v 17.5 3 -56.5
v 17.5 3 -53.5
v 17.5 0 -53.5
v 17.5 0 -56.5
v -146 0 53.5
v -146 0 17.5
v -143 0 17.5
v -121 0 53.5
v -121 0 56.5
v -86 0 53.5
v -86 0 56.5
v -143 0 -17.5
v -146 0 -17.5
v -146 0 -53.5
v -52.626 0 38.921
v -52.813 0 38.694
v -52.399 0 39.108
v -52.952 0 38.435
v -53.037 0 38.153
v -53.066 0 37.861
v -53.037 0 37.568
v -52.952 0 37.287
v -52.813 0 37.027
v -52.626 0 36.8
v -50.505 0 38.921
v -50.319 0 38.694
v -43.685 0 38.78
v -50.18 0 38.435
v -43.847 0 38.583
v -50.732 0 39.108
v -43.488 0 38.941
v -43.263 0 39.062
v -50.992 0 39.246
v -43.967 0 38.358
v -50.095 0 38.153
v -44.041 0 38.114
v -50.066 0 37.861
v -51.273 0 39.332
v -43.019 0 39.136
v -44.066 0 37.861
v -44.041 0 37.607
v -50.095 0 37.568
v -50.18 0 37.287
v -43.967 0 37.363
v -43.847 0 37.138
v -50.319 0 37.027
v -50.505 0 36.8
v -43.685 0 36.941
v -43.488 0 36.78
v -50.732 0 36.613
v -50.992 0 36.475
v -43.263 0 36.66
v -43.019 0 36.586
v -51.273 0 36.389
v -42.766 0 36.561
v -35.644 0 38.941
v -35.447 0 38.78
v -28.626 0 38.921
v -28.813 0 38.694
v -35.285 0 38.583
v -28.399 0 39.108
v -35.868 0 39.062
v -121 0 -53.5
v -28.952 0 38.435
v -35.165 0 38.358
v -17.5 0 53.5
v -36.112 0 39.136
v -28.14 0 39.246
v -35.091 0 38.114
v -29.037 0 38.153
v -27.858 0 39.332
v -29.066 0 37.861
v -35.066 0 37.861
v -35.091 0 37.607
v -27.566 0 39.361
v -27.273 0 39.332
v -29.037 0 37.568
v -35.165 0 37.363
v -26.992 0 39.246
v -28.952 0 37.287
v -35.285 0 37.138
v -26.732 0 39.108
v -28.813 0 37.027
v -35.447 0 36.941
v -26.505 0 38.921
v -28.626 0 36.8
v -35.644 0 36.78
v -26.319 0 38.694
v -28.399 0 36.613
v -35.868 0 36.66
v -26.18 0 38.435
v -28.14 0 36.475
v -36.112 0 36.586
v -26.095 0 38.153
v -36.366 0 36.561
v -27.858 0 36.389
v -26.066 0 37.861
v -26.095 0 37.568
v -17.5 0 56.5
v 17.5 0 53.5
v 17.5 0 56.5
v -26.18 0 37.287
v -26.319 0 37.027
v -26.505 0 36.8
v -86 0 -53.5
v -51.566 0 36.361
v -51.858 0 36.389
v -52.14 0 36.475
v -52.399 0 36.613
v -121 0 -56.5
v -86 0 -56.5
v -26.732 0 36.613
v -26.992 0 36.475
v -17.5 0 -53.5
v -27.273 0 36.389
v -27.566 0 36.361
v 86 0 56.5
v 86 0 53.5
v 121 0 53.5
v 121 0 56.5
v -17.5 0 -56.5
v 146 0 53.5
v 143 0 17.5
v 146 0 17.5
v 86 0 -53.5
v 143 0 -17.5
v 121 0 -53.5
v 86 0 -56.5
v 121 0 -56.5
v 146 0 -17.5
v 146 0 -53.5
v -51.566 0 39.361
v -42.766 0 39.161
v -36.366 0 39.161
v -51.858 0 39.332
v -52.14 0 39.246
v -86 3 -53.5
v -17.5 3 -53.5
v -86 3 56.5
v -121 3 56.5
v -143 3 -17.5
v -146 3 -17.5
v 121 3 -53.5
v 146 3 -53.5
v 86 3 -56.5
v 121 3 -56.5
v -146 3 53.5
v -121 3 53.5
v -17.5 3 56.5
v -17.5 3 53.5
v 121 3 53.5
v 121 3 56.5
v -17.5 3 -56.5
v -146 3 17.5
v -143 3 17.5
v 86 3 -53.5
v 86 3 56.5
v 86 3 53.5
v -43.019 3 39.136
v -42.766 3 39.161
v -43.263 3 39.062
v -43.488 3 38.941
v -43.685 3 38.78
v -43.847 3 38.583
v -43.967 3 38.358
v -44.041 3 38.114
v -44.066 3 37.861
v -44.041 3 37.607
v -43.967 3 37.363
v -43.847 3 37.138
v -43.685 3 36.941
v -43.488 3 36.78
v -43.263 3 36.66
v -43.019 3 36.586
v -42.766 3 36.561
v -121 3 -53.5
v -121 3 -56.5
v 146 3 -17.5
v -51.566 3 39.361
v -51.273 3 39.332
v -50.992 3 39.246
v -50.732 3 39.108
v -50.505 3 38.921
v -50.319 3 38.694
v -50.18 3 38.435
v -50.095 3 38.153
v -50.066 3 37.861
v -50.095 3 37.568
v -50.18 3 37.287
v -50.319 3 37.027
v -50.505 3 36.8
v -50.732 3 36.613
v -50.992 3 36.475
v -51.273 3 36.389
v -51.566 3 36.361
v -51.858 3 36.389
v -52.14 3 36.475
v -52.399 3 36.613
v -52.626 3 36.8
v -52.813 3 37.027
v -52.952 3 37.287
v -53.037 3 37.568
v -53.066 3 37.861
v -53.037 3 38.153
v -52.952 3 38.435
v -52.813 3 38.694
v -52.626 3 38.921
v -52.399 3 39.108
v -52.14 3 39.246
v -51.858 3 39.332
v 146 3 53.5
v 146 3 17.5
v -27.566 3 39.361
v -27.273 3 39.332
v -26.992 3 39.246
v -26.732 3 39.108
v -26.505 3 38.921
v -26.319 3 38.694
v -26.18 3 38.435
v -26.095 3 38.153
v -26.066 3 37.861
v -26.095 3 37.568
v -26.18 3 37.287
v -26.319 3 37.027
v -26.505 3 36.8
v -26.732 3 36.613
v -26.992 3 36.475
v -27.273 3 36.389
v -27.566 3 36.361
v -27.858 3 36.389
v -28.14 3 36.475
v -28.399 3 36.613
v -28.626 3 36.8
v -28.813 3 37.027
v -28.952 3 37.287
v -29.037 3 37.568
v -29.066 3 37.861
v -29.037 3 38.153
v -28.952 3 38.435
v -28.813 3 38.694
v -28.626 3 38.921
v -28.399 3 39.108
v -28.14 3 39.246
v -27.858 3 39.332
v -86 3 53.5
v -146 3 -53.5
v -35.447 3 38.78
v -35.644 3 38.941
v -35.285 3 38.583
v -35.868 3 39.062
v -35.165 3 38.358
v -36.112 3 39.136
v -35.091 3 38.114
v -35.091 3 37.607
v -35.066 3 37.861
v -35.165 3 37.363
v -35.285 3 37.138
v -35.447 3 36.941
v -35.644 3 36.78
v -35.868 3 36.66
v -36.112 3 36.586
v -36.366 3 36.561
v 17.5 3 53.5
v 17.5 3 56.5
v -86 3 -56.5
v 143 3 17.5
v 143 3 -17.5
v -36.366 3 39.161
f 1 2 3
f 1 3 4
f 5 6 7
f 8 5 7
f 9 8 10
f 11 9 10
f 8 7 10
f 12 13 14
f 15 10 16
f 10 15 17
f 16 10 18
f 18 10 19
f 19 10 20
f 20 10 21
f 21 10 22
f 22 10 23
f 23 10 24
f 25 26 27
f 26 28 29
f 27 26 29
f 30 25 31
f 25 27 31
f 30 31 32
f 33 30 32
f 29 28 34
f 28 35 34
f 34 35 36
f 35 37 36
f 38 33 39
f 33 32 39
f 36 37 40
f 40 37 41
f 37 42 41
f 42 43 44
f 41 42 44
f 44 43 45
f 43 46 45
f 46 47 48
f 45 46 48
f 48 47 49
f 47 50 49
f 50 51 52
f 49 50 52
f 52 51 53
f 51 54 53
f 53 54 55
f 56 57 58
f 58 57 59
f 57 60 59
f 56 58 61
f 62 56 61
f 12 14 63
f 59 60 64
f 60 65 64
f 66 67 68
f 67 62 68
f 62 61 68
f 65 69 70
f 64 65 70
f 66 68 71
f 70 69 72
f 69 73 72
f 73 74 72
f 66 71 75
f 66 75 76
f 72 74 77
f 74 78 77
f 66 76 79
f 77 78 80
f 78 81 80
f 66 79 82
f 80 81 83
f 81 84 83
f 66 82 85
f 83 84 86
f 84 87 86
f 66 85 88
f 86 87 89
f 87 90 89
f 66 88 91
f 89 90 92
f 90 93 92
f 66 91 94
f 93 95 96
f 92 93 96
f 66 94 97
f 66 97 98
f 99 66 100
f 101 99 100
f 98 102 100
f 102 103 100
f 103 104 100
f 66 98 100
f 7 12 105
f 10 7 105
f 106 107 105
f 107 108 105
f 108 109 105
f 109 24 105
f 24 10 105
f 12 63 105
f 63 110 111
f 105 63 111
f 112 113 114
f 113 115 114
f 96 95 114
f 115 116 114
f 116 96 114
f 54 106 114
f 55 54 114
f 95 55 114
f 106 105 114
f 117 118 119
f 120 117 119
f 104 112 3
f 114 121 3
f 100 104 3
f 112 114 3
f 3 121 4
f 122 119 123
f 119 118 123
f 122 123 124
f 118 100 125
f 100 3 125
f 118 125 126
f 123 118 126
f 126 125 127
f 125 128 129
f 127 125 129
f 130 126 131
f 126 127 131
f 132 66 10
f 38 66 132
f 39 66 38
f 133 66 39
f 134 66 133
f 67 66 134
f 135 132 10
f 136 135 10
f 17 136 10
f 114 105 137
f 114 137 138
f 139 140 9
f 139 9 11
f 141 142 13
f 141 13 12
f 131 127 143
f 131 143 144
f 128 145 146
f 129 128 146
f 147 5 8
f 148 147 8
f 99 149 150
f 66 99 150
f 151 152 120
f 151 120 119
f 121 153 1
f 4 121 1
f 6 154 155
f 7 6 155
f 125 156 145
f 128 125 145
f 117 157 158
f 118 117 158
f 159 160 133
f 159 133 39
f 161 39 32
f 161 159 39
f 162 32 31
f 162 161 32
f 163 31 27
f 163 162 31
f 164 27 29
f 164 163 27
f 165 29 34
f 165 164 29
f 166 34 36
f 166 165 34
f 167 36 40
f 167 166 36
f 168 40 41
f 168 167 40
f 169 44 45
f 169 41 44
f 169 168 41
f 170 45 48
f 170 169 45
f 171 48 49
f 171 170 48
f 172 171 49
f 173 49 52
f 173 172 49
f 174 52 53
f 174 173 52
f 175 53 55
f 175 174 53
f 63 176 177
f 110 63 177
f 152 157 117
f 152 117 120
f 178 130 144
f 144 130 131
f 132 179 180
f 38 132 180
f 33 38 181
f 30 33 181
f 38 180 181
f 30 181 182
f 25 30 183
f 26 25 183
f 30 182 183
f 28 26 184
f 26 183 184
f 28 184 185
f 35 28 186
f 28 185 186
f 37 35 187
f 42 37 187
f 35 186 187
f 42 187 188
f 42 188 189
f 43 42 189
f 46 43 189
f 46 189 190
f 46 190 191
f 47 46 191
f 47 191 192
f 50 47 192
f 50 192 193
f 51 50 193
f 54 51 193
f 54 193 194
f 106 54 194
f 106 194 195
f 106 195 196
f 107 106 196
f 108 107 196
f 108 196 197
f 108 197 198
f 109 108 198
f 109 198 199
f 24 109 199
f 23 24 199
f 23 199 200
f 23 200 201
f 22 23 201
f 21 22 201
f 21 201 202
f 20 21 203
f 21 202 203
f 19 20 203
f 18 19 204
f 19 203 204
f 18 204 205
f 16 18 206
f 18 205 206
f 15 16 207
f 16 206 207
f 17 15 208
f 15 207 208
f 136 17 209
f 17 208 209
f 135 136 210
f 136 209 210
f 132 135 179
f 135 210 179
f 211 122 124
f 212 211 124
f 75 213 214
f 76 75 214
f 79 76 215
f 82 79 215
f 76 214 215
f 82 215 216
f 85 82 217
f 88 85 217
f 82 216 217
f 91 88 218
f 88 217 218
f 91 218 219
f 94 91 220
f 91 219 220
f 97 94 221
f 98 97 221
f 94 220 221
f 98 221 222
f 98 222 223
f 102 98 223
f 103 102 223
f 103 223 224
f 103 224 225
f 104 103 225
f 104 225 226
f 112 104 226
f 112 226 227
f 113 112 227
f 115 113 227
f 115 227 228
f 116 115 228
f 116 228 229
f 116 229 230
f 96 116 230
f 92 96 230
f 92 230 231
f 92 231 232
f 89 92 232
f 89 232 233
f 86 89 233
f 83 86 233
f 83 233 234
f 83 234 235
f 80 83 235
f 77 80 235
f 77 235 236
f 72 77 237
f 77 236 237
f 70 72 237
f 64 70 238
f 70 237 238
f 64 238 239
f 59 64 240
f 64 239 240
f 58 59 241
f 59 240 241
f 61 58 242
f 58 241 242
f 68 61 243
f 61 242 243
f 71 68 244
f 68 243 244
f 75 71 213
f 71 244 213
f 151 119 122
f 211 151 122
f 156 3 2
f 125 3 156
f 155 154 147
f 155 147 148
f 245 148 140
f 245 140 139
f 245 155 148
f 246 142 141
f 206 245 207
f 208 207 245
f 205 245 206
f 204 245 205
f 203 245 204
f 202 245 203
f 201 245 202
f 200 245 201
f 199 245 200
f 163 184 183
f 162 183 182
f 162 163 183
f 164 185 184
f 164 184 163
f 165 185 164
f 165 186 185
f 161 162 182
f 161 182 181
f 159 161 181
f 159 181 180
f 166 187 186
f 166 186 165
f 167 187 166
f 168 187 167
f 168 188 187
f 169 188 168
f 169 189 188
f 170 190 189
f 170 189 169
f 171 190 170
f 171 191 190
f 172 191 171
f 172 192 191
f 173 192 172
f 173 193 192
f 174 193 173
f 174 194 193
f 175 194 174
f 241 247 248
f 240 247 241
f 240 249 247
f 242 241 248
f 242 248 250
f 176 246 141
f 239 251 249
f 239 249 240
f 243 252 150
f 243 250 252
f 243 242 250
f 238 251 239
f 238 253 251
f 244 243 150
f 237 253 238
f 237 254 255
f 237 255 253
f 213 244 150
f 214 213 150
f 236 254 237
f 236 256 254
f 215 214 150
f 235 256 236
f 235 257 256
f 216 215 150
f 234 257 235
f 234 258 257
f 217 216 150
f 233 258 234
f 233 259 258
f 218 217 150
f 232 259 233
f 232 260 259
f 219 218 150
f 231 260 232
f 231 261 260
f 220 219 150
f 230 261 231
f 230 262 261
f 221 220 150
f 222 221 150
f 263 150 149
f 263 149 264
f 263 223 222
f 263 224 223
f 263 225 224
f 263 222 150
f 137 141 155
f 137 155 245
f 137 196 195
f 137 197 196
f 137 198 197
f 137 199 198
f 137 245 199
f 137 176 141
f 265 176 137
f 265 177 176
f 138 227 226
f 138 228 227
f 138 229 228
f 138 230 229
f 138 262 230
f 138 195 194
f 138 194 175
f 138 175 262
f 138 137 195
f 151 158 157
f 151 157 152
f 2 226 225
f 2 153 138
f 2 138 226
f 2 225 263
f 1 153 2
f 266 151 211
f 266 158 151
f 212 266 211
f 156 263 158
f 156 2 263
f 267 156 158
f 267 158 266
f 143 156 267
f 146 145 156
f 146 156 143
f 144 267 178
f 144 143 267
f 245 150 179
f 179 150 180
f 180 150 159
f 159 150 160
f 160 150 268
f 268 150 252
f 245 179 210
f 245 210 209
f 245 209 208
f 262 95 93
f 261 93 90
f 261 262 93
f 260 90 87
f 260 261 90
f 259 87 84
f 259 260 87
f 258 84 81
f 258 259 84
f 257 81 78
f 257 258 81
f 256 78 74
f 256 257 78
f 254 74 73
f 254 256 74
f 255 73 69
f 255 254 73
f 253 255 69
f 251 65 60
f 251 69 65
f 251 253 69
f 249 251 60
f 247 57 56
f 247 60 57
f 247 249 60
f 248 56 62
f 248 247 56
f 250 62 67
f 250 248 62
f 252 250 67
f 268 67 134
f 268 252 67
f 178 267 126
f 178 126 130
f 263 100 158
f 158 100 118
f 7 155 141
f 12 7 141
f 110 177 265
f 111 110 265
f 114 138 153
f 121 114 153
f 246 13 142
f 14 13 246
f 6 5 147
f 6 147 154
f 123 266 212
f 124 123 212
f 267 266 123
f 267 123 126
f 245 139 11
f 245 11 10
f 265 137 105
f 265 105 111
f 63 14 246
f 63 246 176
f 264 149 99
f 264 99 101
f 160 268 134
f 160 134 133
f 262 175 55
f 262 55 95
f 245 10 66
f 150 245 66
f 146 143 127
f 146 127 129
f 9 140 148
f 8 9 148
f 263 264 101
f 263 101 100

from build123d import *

# Parameters (mm, degrees)
SKETCH1_W           = 292
SKETCH1_H           = 107
BOSS_EXTRUDE1_DEPTH = 3
SKETCH8_W           = 3
SKETCH8_H           = 35
CUT_EXTRUDE7_DEPTH  = 3
SKETCH7_W           = 35
SKETCH7_H           = 3
BOSS_EXTRUDE2_DEPTH = 3
SKETCH4_W           = 35
SKETCH4_H           = 3
BOSS_EXTRUDE3_DEPTH = 3
SKETCH9_R           = 1.5
CUT_EXTRUDE8_DEPTH  = 10


with BuildPart() as part:
    # Sketch1 → Boss-Extrude1 (new body)
    with BuildSketch(Plane(origin=(0, 0, 0), x_dir=(1, 0, 0), z_dir=(0, 1, 0))):
        Rectangle(SKETCH1_W, SKETCH1_H)
    extrude(amount=BOSS_EXTRUDE1_DEPTH)

    # Sketch8 → Cut-Extrude7 (cut)
    with BuildSketch(Plane(origin=(0, 3, 0), x_dir=(1, 0, 0), z_dir=(0, 1, 0))):
        with Locations((144.5, 0)):
            Rectangle(SKETCH8_W, SKETCH8_H)
        with Locations((-144.5, 0)):
            Rectangle(SKETCH8_W, SKETCH8_H)
    extrude(amount=-CUT_EXTRUDE7_DEPTH, mode=Mode.SUBTRACT)

    # Sketch7 → Boss-Extrude2 (add)
    with BuildSketch(Plane(origin=(0, 3, 0), x_dir=(1, 0, 0), z_dir=(0, 1, 0))):
        with Locations((0, -55)):
            Rectangle(SKETCH7_W, SKETCH7_H)
        with Locations((0, 55)):
            Rectangle(SKETCH7_W, SKETCH7_H)
    extrude(amount=-BOSS_EXTRUDE2_DEPTH)

    # Sketch4 → Boss-Extrude3 (add)
    with BuildSketch(Plane(origin=(0, 3, 0), x_dir=(1, 0, 0), z_dir=(0, 1, 0))):
        with Locations((-103.5, -55)):
            Rectangle(SKETCH4_W, SKETCH4_H)
        with Locations((-103.5, 55)):
            Rectangle(SKETCH4_W, SKETCH4_H)
        with Locations((103.5, 55)):
            Rectangle(SKETCH4_W, SKETCH4_H)
        with Locations((103.5, -55)):
            Rectangle(SKETCH4_W, SKETCH4_H)
    extrude(amount=-BOSS_EXTRUDE3_DEPTH)

    # Sketch9 → Cut-Extrude8 (cut)
    with BuildSketch(Plane(origin=(0, 3, 0), x_dir=(1, 0, 0), z_dir=(0, 1, 0))):
        with Locations(Location((-27.565814615, -37.860553904, 0), (0, 0, 270))):
            Circle(SKETCH9_R)
        with Locations(Location((-51.565814615, -37.860553904, 0), (0, 0, 270))):
            Circle(SKETCH9_R)
        with BuildLine():
            Line((-42.765814615, -36.560553904), (-36.365814615, -36.560553904))
            ThreePointArc((-36.365814615, -36.560553904), (-35.065814615, -37.860553904), (-36.365814615, -39.160553904))
            Line((-36.365814615, -39.160553904), (-42.765814615, -39.160553904))
            ThreePointArc((-42.765814615, -39.160553904), (-44.065814615, -37.860553904), (-42.765814615, -36.560553904))
        make_face()
    extrude(amount=-CUT_EXTRUDE8_DEPTH, mode=Mode.SUBTRACT)


solid = part.part
